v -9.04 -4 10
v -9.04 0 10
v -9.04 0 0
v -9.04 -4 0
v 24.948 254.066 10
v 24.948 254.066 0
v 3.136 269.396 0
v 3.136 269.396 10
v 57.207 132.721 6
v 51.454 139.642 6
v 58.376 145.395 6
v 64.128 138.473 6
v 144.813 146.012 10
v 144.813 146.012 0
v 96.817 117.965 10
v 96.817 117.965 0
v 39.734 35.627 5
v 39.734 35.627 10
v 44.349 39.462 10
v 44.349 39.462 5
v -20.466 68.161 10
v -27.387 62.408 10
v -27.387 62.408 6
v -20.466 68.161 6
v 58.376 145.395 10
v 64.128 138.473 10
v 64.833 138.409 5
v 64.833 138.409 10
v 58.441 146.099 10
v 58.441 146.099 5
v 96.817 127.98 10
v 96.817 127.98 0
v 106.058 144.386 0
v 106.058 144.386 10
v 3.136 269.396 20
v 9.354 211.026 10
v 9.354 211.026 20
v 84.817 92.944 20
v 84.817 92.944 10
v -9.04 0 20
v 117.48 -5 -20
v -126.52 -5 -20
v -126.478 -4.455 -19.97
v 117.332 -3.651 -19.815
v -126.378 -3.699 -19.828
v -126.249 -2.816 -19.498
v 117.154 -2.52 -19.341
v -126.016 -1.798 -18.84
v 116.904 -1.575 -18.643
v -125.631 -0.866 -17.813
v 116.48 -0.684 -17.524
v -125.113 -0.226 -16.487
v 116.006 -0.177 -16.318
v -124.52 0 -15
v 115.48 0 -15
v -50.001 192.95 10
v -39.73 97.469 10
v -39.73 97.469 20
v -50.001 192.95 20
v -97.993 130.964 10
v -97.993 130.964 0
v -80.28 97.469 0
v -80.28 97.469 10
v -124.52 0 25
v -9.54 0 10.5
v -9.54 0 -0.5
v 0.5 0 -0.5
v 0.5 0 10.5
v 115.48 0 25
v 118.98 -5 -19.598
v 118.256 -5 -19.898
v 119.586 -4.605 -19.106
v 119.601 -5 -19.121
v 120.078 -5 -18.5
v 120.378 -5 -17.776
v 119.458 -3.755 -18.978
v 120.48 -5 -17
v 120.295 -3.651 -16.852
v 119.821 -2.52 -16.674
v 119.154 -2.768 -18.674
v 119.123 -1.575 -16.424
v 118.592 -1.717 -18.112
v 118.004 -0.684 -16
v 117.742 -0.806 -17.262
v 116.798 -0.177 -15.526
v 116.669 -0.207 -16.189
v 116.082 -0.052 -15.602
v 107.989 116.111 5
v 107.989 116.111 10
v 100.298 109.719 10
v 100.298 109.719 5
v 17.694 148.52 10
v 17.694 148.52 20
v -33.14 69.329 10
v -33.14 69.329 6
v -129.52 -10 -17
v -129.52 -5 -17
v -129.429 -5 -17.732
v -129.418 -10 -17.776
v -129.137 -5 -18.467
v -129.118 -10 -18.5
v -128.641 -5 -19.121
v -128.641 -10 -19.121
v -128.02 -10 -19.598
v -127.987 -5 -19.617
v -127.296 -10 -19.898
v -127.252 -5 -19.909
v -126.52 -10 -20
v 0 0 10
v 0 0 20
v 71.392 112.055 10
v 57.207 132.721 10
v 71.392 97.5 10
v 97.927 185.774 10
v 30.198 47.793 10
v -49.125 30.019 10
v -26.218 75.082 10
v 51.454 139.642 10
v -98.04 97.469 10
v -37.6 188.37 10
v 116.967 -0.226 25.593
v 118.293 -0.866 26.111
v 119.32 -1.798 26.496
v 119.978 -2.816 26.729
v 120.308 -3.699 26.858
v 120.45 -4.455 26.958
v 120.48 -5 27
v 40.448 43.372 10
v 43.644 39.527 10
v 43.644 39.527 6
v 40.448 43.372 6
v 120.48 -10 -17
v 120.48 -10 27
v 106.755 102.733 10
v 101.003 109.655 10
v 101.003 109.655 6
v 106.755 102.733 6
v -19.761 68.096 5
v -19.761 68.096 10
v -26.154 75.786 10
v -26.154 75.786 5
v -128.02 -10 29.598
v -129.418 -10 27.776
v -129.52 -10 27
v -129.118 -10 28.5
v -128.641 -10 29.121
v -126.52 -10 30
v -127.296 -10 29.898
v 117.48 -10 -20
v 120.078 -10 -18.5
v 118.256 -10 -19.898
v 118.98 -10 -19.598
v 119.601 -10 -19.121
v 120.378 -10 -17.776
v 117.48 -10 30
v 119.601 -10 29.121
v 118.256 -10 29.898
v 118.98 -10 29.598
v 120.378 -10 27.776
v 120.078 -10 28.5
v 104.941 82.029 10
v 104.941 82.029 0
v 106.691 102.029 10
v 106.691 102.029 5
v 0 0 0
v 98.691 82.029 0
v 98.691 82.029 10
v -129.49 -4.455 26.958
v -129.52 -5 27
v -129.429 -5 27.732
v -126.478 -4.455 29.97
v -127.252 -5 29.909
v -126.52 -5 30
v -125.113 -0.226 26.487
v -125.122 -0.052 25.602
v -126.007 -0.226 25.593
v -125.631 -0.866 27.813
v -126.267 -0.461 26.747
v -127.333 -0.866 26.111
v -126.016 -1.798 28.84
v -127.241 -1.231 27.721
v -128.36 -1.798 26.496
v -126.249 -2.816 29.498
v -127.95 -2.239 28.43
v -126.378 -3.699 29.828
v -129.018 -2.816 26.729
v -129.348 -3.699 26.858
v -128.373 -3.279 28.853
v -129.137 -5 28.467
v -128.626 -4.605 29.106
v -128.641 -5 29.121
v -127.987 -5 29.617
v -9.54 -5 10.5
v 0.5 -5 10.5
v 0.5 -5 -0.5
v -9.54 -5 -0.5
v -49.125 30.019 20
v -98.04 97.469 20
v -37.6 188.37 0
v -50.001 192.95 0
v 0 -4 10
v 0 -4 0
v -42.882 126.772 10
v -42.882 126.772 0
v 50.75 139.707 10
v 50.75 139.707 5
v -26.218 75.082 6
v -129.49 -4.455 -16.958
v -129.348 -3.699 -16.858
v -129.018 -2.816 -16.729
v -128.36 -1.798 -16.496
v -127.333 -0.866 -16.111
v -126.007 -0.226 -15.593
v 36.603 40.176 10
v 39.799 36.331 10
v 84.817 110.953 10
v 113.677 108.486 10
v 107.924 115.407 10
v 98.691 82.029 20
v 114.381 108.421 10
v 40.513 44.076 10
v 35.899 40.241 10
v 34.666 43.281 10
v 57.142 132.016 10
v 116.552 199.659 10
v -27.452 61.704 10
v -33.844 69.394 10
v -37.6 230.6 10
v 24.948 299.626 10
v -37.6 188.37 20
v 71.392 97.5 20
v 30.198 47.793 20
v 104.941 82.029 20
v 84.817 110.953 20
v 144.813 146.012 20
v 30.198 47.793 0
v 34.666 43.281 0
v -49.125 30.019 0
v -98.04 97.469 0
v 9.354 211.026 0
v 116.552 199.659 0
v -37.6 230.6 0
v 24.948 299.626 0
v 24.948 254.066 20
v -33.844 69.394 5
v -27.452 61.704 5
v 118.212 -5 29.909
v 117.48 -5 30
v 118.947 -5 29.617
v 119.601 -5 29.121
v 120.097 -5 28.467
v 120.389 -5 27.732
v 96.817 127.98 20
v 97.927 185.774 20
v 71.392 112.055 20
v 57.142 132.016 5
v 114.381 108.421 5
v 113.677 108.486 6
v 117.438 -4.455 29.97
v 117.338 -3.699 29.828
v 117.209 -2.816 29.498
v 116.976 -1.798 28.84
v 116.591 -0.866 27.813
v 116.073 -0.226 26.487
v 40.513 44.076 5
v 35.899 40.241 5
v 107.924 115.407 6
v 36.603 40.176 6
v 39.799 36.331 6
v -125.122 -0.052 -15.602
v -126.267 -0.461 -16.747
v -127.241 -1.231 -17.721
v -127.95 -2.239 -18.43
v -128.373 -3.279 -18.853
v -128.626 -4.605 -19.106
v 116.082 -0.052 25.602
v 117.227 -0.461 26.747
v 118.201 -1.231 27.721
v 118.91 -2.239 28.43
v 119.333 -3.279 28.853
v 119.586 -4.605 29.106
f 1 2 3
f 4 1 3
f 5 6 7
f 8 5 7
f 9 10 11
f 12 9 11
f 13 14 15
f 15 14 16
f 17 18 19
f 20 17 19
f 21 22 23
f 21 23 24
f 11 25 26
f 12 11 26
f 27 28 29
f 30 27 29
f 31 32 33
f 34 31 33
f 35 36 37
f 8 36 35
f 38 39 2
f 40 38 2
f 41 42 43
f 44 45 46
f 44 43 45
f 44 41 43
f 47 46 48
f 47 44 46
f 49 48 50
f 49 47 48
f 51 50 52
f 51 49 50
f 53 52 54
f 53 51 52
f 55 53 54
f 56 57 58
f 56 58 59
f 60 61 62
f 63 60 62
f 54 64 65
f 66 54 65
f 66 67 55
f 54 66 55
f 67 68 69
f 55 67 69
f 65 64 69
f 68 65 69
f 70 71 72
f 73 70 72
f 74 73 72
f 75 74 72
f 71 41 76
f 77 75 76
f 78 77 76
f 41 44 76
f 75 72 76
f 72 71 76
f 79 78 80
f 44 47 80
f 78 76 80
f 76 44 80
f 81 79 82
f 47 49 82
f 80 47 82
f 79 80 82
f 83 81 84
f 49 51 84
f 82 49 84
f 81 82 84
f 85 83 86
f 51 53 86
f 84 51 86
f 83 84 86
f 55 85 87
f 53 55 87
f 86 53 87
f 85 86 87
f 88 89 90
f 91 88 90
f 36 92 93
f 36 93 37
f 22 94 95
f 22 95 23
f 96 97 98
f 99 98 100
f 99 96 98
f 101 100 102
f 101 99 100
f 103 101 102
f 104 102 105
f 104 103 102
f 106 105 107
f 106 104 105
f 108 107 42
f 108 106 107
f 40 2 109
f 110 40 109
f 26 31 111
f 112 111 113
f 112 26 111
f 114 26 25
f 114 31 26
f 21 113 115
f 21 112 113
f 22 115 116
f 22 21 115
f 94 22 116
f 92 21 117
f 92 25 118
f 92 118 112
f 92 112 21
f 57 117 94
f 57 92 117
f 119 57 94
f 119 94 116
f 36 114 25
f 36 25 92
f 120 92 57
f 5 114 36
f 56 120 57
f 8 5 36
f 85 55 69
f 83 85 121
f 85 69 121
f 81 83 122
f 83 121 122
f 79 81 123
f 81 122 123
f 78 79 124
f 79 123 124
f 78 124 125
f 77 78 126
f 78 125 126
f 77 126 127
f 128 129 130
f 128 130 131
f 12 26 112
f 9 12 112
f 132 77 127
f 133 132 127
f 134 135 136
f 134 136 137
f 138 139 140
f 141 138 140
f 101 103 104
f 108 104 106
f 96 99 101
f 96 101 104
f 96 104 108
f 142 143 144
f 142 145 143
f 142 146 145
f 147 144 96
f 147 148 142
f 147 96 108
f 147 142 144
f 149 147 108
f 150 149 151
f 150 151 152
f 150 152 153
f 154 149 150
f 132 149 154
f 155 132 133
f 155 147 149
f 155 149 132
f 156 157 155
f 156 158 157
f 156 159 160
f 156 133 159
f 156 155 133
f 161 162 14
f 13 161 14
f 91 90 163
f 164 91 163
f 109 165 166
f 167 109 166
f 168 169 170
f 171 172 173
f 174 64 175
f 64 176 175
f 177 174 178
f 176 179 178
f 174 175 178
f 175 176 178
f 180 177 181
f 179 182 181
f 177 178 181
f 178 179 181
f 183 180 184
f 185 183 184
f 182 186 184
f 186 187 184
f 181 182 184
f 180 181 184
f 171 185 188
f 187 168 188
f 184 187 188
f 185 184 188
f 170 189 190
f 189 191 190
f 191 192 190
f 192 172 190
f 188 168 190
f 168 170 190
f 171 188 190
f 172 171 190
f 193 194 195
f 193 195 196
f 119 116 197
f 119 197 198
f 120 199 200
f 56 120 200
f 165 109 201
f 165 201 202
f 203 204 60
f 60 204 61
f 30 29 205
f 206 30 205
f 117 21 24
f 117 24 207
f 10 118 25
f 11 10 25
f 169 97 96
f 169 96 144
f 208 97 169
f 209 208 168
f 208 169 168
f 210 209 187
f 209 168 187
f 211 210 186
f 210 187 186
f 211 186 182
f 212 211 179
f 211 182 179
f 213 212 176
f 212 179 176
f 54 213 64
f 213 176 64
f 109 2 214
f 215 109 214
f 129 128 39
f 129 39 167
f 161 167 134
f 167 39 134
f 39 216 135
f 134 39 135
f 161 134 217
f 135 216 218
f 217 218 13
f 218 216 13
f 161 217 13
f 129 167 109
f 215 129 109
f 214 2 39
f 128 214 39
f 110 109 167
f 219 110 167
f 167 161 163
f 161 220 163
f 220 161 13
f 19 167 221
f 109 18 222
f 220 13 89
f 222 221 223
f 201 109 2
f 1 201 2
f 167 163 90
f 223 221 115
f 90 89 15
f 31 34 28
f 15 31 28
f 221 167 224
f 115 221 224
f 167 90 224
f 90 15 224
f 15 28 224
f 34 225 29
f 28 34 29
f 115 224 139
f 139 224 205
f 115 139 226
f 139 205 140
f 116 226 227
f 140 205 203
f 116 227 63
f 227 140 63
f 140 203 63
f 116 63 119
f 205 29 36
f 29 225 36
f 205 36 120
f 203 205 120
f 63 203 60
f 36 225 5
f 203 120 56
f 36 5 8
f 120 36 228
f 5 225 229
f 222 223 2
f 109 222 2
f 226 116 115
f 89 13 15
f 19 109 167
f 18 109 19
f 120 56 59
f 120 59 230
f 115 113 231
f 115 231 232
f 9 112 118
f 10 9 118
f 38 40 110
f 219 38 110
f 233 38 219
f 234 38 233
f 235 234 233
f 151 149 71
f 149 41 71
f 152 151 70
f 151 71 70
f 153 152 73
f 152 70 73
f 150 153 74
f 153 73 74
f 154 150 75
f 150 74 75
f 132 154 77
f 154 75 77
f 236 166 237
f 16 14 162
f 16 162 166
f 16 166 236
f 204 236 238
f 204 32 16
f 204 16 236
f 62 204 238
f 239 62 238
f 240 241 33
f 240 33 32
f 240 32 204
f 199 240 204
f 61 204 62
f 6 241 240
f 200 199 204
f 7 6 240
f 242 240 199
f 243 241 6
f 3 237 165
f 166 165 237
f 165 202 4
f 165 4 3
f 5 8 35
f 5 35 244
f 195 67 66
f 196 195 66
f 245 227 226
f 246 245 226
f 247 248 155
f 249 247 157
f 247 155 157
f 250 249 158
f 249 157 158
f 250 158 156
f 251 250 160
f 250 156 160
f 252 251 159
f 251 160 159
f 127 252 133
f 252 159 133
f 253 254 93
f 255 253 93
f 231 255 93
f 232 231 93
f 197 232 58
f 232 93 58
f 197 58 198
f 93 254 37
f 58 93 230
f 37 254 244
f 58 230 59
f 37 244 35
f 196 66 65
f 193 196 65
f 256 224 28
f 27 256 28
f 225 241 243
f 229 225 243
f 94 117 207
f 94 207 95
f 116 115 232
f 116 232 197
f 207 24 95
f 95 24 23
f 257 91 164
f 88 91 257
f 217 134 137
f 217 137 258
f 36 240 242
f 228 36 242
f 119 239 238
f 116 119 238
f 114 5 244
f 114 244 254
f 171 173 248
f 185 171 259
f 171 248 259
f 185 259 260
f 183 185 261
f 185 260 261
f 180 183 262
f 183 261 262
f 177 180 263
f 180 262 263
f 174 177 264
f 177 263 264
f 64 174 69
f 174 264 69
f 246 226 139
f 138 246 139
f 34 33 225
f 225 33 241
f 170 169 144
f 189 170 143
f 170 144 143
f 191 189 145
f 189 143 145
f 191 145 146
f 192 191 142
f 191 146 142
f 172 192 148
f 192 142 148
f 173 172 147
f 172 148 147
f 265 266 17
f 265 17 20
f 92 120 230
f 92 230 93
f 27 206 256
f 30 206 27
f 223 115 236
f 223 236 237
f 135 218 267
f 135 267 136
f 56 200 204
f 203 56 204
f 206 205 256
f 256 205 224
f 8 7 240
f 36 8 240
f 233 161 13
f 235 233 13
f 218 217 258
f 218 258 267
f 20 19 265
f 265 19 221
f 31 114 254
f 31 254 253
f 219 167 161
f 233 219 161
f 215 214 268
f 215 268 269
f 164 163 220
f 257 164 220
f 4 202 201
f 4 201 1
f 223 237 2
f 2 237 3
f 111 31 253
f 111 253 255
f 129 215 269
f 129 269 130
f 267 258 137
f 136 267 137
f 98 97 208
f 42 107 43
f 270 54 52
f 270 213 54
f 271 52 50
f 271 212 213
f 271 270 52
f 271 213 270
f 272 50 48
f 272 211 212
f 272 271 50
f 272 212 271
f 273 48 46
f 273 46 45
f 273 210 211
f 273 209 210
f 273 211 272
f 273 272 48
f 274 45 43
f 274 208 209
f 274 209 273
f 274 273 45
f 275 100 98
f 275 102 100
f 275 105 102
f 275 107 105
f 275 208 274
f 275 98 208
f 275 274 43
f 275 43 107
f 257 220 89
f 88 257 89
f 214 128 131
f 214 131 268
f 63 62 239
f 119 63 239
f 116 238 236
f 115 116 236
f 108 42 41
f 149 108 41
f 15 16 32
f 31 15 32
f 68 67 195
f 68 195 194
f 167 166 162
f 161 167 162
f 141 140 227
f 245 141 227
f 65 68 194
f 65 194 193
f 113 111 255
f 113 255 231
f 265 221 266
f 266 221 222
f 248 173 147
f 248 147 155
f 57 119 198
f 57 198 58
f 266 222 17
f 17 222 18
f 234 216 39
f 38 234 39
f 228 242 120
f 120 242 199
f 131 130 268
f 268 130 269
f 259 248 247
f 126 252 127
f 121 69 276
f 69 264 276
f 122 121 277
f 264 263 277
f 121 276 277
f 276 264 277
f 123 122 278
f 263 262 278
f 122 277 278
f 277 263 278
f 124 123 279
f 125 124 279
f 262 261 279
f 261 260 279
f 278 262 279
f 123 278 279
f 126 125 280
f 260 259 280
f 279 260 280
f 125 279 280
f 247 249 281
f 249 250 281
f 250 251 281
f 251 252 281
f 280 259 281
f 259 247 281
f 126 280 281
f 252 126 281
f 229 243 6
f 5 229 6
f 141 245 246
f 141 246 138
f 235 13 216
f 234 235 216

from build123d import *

# Parameters (mm, degrees)
PAD_DEPTH       = 10
POCKET_DEPTH    = 5
POCKET_FACE2_W  = 9.04
POCKET_FACE2_H  = 10
PAD001_DEPTH    = 4
SKETCH002_W     = 250
SKETCH002_H     = 50
PAD002_DEPTH    = 10
SKETCH003_W     = 10.04
SKETCH003_H     = 11
POCKET001_DEPTH = 5
FILLET_R        = 5
FILLET001_R     = 3
PAD003_DEPTH    = 10
PAD006_DEPTH    = 4
PAD004_DEPTH    = 10
PAD005_DEPTH    = 4


with BuildPart() as back:
    # Sketch → Pad (new body)
    with BuildSketch(Plane.XY):
        Polygon((0, 0), (98.69052, 82.029081), (104.94052, 82.029081), (144.812993, 146.012188), (96.816834, 117.965498), (96.816834, 127.979683), (106.057689, 144.386252), (116.551531, 199.658912), (24.948255, 299.626346), (24.948255, 254.066346), (3.136383, 269.395986), (9.35371, 211.026175), (-37.599752, 230.599865), (-37.599752, 188.369865), (-50.001043, 192.949862), (-42.881904, 126.771682), (-97.992689, 130.963851), (-80.280364, 97.468693), (-98.040364, 97.468693), (-49.124939, 30.018684), (30.198039, 47.793084), (34.66617, 43.281067), (-9.04, 0), align=None)
    extrude(amount=PAD_DEPTH)

    # Sketch001 (on Face25 of Pad) → Pocket (cut)
    with BuildSketch(Plane.XY.offset(10)):
        Polygon((-33.84387, 69.39439), (-27.451828, 61.70402), (-19.761458, 68.096062), (-26.1535, 75.786432), align=None)
        Polygon((50.750201, 139.706857), (57.142244, 132.016487), (64.832614, 138.40853), (58.440572, 146.0989), align=None)
        Polygon((100.298478, 109.719451), (106.69052, 102.029081), (114.38089, 108.421124), (107.988848, 116.111494), align=None)
        Polygon((35.89911, 40.241059), (39.734335, 35.626837), (44.348558, 39.462062), (40.513332, 44.076284), align=None)
    extrude(amount=-POCKET_DEPTH, mode=Mode.SUBTRACT)

    # Pocket Face2 → Pad001 (add)
    with BuildSketch(Plane(origin=(-4.52, 0, 5), x_dir=(-1, 0, 0), z_dir=(0, -1, 0))):
        Rectangle(POCKET_FACE2_W, POCKET_FACE2_H)
    extrude(amount=PAD001_DEPTH)


with BuildPart() as foot:
    # Sketch002 (on Face1 of ShapeBinder) → Pad002 (new body)
    with BuildSketch(Plane.XZ):
        with Locations((-4.52, 5)):
            Rectangle(SKETCH002_W, SKETCH002_H)
    extrude(amount=PAD002_DEPTH)

    # Sketch003 (on Face5 of Pad002) → Pocket001 (cut)
    with BuildSketch(Plane(origin=(0, 0, 0), x_dir=(-1, 0, 0), z_dir=(0, 1, 0))):
        with Locations((4.52, 5)):
            Rectangle(SKETCH003_W, SKETCH003_H)
    extrude(amount=-POCKET001_DEPTH, mode=Mode.SUBTRACT)

    # Fillet
    fillet_edges = [foot.edges().sort_by_distance(p)[0] for p in [
        (-4.52, 0, 30),
        (-129.52, 0, 5),
        (-4.52, 0, -20),
        (120.48, 0, 5),
    ]]
    fillet(fillet_edges, radius=FILLET_R)

    # Fillet001
    fillet001_edges = [foot.edges().sort_by_distance(p)[0] for p in [
        (120.48, -7.5, 30),
        (-129.52, -7.5, 30),
        (-127.750245, -1.18352, 28.230245),
        (118.710245, -1.18352, 28.230245),
        (118.710245, -1.18352, -18.230245),
        (120.48, -7.5, -20),
        (-129.52, -7.5, -20),
        (-127.750245, -1.18352, -18.230245),
    ]]
    fillet(fillet001_edges, radius=FILLET001_R)


with BuildPart() as frontwings:
    # Sketch004 (on Face1 of ShapeBinder001) → Pad003 (new body)
    with BuildSketch(Plane.XY.offset(10)):
        Polygon((30.198039, 47.793084), (-49.124939, 30.018684), (-98.040364, 97.468693), (-39.729625, 97.468693), (-50.001043, 192.949862), (-37.599752, 188.369865), (17.693781, 148.520245), (9.35371, 211.026175), (3.136383, 269.395986), (24.948255, 254.066346), (97.926551, 185.774464), (96.816834, 127.979683), (71.392053, 112.055472), (71.392053, 97.499712), align=None)
    extrude(amount=PAD003_DEPTH)

    # Sketch007 (on Face15 of Pad003) → Pad006 (join)
    with BuildSketch(Plane(origin=(0, 0, 10), x_dir=(1, 0, 0), z_dir=(0, 0, -1))):
        Polygon((58.375655, -145.394779), (64.128493, -138.473446), (57.20716, -132.720608), (51.454322, -139.641941), align=None)
        Polygon((-20.465578, -68.160979), (-26.218416, -75.082312), (-33.139749, -69.329474), (-27.386911, -62.40814), align=None)
    extrude(amount=PAD006_DEPTH)


with BuildPart() as frontbody:
    # Sketch005 (on Face1 of ShapeBinder002) → Pad004 (new body)
    with BuildSketch(Plane.XY.offset(10)):
        Polygon((-9.04, 0), (0, 0), (98.69052, 82.029081), (104.94052, 82.029081), (144.812993, 146.012188), (84.817065, 110.953398), (84.817065, 92.944174), align=None)
    extrude(amount=PAD004_DEPTH)

    # Sketch006 (on Face8 of Pad004) → Pad005 (join)
    with BuildSketch(Plane(origin=(0, 0, 10), x_dir=(1, 0, 0), z_dir=(0, 0, -1))):
        Polygon((113.67677, -108.48604), (107.923931, -115.407373), (101.002598, -109.654535), (106.755436, -102.733202), align=None)
        Polygon((43.644437, -39.526978), (40.448416, -43.372164), (36.603231, -40.176142), (39.799252, -36.330957), align=None)
    extrude(amount=PAD005_DEPTH)


solid = Compound([back.part, foot.part, frontwings.part, frontbody.part])
